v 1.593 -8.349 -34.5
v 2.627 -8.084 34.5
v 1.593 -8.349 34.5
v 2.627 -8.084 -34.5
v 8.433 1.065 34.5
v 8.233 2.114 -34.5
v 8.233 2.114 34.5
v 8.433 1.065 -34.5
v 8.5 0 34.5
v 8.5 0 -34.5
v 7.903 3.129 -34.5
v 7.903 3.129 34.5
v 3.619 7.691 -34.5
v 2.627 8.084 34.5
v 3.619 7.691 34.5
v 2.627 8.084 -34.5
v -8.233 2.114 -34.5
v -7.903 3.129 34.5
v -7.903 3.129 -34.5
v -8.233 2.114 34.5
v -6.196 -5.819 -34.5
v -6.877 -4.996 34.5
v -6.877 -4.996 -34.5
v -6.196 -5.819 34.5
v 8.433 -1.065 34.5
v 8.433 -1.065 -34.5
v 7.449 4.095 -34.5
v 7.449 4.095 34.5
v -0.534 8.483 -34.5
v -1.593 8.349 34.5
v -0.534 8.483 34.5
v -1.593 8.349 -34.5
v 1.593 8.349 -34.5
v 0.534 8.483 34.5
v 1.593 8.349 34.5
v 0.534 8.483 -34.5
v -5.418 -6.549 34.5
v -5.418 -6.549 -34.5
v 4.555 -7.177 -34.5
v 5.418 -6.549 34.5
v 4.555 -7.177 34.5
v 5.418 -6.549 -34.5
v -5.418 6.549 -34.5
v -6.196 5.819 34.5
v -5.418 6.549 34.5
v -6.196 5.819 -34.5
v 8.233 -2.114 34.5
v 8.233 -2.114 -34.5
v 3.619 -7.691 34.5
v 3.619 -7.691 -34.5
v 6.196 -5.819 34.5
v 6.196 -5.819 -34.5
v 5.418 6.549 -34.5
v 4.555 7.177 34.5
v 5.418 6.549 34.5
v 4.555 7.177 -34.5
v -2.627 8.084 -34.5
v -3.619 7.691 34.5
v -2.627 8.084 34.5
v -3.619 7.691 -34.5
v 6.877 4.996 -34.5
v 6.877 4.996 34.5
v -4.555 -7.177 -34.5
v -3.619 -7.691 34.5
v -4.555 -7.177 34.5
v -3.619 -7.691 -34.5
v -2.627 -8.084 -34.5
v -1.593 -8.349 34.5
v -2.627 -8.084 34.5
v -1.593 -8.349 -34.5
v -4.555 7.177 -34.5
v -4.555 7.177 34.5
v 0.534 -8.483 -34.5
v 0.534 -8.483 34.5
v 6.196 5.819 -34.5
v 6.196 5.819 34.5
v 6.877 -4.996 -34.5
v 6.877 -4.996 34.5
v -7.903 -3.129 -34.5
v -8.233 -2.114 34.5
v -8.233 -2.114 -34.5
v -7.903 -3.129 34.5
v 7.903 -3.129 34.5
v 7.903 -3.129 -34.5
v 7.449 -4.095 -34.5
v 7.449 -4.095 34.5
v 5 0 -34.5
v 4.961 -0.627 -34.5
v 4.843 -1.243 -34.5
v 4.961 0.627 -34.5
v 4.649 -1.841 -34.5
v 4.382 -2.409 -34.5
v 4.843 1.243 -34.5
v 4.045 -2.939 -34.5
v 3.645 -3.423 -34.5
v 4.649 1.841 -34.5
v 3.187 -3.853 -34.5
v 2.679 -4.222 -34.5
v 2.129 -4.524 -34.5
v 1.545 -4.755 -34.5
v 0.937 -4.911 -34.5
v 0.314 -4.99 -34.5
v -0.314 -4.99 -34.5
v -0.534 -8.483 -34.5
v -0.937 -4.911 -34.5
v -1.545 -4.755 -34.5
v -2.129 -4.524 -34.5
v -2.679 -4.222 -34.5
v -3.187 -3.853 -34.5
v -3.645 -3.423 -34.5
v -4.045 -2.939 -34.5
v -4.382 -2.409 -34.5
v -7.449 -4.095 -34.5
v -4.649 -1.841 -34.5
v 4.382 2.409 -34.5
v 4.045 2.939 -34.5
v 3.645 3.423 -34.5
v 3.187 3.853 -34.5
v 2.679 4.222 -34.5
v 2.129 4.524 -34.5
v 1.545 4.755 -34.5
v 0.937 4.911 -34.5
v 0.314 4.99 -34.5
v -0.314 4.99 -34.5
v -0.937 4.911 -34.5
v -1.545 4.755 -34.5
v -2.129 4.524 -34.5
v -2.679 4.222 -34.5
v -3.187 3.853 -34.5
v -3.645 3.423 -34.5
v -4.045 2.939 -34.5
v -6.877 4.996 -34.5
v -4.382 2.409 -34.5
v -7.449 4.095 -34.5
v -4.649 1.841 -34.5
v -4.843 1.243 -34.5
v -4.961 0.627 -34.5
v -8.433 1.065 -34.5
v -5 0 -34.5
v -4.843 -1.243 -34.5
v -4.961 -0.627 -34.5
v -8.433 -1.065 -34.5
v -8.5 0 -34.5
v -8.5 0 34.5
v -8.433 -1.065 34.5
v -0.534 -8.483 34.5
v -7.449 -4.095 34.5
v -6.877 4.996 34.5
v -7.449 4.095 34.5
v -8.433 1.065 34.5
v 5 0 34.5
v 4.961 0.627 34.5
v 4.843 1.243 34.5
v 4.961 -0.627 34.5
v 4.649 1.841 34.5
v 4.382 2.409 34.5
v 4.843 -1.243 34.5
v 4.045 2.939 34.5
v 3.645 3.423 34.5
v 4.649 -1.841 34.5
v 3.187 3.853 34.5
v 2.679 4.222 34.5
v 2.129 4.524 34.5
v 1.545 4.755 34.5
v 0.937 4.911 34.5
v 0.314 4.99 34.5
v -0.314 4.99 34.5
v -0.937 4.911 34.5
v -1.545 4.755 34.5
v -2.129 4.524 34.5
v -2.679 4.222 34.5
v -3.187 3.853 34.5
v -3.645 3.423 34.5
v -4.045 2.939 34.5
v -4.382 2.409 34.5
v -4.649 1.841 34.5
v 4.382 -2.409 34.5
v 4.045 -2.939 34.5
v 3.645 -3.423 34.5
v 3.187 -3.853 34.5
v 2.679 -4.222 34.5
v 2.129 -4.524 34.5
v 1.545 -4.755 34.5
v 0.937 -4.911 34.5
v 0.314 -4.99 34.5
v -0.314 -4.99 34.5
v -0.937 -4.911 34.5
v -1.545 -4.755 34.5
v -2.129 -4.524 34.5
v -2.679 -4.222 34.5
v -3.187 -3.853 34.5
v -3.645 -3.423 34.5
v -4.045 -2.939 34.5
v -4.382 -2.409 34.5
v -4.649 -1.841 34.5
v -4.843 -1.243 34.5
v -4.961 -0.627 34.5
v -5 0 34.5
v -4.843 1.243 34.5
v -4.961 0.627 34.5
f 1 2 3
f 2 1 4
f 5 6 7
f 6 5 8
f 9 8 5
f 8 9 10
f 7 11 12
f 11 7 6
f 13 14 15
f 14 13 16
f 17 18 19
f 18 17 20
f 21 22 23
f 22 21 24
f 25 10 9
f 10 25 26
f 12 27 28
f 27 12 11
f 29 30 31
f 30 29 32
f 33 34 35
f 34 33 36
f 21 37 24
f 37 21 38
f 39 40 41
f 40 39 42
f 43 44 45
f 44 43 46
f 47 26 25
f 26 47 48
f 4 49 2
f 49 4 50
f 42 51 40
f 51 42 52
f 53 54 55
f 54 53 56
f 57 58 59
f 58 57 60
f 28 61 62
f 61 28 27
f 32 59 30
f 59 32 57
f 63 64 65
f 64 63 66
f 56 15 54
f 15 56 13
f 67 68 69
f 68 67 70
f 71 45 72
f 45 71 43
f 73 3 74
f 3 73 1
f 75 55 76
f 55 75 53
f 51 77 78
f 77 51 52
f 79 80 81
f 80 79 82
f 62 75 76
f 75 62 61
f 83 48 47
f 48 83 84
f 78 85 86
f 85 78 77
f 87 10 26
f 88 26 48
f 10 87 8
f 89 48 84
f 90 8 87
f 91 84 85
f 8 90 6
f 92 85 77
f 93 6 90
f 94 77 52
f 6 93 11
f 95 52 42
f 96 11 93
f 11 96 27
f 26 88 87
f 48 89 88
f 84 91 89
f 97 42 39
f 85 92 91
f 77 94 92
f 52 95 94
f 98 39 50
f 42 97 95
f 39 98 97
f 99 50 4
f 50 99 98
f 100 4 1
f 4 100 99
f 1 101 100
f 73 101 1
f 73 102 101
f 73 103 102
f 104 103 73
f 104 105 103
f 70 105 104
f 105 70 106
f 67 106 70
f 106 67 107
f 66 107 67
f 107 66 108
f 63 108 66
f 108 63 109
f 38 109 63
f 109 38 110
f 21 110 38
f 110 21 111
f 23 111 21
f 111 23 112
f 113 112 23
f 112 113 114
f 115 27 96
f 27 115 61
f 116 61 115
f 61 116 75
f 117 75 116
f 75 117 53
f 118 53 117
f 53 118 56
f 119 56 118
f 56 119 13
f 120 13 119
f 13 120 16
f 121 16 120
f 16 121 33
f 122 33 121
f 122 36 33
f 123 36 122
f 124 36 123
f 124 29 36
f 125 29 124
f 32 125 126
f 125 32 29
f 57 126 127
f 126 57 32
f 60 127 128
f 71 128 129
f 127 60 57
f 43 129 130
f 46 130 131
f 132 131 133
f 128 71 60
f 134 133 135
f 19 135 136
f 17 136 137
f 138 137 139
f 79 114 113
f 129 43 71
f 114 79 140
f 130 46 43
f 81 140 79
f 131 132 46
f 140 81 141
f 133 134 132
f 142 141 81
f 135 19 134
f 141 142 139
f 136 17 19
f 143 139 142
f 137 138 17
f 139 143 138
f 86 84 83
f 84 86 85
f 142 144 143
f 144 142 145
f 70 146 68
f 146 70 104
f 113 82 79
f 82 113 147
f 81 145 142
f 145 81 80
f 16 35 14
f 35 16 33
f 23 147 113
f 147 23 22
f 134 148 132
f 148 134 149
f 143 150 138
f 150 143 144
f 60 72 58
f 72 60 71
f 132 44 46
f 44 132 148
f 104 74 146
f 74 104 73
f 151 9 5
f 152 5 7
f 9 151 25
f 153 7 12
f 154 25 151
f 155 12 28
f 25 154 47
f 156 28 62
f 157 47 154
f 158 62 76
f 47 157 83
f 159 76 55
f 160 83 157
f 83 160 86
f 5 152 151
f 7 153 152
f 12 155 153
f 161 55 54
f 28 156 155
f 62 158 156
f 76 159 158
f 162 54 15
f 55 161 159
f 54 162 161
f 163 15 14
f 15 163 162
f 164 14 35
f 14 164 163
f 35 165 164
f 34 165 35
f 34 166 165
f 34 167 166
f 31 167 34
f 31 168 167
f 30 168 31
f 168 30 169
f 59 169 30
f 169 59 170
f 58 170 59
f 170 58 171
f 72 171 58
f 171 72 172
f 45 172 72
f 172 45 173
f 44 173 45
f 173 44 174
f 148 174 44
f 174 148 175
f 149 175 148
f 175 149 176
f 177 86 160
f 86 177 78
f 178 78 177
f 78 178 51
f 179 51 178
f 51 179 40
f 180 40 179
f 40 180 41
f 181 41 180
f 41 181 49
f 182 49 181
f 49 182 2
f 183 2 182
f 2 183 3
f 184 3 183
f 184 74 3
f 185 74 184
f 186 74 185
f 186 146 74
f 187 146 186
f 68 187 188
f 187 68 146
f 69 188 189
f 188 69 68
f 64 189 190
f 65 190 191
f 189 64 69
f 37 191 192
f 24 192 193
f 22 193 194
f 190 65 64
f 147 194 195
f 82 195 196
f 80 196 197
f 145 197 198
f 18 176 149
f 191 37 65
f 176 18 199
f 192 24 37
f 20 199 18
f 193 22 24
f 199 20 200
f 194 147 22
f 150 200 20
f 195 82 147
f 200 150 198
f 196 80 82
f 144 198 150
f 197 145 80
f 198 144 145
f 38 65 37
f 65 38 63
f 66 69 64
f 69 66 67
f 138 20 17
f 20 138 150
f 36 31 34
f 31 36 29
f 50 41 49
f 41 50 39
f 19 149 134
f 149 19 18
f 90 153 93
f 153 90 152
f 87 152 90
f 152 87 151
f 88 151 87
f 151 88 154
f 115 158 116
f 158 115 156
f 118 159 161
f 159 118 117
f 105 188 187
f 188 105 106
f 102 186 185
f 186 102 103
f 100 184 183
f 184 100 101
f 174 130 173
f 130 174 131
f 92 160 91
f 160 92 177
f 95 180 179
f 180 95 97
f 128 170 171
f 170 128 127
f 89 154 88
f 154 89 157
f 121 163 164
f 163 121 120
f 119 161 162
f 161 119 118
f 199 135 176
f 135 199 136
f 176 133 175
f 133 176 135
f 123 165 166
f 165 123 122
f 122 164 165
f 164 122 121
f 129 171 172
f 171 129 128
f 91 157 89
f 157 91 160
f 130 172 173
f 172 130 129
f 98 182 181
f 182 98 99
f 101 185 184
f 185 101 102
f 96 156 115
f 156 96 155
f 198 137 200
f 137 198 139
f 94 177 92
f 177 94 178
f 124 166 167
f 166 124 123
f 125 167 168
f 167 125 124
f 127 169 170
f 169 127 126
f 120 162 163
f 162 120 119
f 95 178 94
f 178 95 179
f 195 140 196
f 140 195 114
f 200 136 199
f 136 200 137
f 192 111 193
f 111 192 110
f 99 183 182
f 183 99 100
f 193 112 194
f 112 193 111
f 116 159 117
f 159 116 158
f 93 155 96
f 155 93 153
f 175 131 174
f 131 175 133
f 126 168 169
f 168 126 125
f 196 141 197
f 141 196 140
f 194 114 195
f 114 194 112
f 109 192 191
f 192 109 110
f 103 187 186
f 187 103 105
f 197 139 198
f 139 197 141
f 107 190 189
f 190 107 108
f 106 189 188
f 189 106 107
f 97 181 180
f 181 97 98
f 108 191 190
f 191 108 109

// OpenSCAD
$fn = 50;


difference() {
	union() {
		translate(v = [0, 0, -34.5000000000]) {
			cylinder(h = 69, r = 8.5000000000);
		}
	}
	union() {
		translate(v = [0, 0, -100.0000000000]) {
			cylinder(h = 200, r = 5.0000000000);
		}
	}
}
